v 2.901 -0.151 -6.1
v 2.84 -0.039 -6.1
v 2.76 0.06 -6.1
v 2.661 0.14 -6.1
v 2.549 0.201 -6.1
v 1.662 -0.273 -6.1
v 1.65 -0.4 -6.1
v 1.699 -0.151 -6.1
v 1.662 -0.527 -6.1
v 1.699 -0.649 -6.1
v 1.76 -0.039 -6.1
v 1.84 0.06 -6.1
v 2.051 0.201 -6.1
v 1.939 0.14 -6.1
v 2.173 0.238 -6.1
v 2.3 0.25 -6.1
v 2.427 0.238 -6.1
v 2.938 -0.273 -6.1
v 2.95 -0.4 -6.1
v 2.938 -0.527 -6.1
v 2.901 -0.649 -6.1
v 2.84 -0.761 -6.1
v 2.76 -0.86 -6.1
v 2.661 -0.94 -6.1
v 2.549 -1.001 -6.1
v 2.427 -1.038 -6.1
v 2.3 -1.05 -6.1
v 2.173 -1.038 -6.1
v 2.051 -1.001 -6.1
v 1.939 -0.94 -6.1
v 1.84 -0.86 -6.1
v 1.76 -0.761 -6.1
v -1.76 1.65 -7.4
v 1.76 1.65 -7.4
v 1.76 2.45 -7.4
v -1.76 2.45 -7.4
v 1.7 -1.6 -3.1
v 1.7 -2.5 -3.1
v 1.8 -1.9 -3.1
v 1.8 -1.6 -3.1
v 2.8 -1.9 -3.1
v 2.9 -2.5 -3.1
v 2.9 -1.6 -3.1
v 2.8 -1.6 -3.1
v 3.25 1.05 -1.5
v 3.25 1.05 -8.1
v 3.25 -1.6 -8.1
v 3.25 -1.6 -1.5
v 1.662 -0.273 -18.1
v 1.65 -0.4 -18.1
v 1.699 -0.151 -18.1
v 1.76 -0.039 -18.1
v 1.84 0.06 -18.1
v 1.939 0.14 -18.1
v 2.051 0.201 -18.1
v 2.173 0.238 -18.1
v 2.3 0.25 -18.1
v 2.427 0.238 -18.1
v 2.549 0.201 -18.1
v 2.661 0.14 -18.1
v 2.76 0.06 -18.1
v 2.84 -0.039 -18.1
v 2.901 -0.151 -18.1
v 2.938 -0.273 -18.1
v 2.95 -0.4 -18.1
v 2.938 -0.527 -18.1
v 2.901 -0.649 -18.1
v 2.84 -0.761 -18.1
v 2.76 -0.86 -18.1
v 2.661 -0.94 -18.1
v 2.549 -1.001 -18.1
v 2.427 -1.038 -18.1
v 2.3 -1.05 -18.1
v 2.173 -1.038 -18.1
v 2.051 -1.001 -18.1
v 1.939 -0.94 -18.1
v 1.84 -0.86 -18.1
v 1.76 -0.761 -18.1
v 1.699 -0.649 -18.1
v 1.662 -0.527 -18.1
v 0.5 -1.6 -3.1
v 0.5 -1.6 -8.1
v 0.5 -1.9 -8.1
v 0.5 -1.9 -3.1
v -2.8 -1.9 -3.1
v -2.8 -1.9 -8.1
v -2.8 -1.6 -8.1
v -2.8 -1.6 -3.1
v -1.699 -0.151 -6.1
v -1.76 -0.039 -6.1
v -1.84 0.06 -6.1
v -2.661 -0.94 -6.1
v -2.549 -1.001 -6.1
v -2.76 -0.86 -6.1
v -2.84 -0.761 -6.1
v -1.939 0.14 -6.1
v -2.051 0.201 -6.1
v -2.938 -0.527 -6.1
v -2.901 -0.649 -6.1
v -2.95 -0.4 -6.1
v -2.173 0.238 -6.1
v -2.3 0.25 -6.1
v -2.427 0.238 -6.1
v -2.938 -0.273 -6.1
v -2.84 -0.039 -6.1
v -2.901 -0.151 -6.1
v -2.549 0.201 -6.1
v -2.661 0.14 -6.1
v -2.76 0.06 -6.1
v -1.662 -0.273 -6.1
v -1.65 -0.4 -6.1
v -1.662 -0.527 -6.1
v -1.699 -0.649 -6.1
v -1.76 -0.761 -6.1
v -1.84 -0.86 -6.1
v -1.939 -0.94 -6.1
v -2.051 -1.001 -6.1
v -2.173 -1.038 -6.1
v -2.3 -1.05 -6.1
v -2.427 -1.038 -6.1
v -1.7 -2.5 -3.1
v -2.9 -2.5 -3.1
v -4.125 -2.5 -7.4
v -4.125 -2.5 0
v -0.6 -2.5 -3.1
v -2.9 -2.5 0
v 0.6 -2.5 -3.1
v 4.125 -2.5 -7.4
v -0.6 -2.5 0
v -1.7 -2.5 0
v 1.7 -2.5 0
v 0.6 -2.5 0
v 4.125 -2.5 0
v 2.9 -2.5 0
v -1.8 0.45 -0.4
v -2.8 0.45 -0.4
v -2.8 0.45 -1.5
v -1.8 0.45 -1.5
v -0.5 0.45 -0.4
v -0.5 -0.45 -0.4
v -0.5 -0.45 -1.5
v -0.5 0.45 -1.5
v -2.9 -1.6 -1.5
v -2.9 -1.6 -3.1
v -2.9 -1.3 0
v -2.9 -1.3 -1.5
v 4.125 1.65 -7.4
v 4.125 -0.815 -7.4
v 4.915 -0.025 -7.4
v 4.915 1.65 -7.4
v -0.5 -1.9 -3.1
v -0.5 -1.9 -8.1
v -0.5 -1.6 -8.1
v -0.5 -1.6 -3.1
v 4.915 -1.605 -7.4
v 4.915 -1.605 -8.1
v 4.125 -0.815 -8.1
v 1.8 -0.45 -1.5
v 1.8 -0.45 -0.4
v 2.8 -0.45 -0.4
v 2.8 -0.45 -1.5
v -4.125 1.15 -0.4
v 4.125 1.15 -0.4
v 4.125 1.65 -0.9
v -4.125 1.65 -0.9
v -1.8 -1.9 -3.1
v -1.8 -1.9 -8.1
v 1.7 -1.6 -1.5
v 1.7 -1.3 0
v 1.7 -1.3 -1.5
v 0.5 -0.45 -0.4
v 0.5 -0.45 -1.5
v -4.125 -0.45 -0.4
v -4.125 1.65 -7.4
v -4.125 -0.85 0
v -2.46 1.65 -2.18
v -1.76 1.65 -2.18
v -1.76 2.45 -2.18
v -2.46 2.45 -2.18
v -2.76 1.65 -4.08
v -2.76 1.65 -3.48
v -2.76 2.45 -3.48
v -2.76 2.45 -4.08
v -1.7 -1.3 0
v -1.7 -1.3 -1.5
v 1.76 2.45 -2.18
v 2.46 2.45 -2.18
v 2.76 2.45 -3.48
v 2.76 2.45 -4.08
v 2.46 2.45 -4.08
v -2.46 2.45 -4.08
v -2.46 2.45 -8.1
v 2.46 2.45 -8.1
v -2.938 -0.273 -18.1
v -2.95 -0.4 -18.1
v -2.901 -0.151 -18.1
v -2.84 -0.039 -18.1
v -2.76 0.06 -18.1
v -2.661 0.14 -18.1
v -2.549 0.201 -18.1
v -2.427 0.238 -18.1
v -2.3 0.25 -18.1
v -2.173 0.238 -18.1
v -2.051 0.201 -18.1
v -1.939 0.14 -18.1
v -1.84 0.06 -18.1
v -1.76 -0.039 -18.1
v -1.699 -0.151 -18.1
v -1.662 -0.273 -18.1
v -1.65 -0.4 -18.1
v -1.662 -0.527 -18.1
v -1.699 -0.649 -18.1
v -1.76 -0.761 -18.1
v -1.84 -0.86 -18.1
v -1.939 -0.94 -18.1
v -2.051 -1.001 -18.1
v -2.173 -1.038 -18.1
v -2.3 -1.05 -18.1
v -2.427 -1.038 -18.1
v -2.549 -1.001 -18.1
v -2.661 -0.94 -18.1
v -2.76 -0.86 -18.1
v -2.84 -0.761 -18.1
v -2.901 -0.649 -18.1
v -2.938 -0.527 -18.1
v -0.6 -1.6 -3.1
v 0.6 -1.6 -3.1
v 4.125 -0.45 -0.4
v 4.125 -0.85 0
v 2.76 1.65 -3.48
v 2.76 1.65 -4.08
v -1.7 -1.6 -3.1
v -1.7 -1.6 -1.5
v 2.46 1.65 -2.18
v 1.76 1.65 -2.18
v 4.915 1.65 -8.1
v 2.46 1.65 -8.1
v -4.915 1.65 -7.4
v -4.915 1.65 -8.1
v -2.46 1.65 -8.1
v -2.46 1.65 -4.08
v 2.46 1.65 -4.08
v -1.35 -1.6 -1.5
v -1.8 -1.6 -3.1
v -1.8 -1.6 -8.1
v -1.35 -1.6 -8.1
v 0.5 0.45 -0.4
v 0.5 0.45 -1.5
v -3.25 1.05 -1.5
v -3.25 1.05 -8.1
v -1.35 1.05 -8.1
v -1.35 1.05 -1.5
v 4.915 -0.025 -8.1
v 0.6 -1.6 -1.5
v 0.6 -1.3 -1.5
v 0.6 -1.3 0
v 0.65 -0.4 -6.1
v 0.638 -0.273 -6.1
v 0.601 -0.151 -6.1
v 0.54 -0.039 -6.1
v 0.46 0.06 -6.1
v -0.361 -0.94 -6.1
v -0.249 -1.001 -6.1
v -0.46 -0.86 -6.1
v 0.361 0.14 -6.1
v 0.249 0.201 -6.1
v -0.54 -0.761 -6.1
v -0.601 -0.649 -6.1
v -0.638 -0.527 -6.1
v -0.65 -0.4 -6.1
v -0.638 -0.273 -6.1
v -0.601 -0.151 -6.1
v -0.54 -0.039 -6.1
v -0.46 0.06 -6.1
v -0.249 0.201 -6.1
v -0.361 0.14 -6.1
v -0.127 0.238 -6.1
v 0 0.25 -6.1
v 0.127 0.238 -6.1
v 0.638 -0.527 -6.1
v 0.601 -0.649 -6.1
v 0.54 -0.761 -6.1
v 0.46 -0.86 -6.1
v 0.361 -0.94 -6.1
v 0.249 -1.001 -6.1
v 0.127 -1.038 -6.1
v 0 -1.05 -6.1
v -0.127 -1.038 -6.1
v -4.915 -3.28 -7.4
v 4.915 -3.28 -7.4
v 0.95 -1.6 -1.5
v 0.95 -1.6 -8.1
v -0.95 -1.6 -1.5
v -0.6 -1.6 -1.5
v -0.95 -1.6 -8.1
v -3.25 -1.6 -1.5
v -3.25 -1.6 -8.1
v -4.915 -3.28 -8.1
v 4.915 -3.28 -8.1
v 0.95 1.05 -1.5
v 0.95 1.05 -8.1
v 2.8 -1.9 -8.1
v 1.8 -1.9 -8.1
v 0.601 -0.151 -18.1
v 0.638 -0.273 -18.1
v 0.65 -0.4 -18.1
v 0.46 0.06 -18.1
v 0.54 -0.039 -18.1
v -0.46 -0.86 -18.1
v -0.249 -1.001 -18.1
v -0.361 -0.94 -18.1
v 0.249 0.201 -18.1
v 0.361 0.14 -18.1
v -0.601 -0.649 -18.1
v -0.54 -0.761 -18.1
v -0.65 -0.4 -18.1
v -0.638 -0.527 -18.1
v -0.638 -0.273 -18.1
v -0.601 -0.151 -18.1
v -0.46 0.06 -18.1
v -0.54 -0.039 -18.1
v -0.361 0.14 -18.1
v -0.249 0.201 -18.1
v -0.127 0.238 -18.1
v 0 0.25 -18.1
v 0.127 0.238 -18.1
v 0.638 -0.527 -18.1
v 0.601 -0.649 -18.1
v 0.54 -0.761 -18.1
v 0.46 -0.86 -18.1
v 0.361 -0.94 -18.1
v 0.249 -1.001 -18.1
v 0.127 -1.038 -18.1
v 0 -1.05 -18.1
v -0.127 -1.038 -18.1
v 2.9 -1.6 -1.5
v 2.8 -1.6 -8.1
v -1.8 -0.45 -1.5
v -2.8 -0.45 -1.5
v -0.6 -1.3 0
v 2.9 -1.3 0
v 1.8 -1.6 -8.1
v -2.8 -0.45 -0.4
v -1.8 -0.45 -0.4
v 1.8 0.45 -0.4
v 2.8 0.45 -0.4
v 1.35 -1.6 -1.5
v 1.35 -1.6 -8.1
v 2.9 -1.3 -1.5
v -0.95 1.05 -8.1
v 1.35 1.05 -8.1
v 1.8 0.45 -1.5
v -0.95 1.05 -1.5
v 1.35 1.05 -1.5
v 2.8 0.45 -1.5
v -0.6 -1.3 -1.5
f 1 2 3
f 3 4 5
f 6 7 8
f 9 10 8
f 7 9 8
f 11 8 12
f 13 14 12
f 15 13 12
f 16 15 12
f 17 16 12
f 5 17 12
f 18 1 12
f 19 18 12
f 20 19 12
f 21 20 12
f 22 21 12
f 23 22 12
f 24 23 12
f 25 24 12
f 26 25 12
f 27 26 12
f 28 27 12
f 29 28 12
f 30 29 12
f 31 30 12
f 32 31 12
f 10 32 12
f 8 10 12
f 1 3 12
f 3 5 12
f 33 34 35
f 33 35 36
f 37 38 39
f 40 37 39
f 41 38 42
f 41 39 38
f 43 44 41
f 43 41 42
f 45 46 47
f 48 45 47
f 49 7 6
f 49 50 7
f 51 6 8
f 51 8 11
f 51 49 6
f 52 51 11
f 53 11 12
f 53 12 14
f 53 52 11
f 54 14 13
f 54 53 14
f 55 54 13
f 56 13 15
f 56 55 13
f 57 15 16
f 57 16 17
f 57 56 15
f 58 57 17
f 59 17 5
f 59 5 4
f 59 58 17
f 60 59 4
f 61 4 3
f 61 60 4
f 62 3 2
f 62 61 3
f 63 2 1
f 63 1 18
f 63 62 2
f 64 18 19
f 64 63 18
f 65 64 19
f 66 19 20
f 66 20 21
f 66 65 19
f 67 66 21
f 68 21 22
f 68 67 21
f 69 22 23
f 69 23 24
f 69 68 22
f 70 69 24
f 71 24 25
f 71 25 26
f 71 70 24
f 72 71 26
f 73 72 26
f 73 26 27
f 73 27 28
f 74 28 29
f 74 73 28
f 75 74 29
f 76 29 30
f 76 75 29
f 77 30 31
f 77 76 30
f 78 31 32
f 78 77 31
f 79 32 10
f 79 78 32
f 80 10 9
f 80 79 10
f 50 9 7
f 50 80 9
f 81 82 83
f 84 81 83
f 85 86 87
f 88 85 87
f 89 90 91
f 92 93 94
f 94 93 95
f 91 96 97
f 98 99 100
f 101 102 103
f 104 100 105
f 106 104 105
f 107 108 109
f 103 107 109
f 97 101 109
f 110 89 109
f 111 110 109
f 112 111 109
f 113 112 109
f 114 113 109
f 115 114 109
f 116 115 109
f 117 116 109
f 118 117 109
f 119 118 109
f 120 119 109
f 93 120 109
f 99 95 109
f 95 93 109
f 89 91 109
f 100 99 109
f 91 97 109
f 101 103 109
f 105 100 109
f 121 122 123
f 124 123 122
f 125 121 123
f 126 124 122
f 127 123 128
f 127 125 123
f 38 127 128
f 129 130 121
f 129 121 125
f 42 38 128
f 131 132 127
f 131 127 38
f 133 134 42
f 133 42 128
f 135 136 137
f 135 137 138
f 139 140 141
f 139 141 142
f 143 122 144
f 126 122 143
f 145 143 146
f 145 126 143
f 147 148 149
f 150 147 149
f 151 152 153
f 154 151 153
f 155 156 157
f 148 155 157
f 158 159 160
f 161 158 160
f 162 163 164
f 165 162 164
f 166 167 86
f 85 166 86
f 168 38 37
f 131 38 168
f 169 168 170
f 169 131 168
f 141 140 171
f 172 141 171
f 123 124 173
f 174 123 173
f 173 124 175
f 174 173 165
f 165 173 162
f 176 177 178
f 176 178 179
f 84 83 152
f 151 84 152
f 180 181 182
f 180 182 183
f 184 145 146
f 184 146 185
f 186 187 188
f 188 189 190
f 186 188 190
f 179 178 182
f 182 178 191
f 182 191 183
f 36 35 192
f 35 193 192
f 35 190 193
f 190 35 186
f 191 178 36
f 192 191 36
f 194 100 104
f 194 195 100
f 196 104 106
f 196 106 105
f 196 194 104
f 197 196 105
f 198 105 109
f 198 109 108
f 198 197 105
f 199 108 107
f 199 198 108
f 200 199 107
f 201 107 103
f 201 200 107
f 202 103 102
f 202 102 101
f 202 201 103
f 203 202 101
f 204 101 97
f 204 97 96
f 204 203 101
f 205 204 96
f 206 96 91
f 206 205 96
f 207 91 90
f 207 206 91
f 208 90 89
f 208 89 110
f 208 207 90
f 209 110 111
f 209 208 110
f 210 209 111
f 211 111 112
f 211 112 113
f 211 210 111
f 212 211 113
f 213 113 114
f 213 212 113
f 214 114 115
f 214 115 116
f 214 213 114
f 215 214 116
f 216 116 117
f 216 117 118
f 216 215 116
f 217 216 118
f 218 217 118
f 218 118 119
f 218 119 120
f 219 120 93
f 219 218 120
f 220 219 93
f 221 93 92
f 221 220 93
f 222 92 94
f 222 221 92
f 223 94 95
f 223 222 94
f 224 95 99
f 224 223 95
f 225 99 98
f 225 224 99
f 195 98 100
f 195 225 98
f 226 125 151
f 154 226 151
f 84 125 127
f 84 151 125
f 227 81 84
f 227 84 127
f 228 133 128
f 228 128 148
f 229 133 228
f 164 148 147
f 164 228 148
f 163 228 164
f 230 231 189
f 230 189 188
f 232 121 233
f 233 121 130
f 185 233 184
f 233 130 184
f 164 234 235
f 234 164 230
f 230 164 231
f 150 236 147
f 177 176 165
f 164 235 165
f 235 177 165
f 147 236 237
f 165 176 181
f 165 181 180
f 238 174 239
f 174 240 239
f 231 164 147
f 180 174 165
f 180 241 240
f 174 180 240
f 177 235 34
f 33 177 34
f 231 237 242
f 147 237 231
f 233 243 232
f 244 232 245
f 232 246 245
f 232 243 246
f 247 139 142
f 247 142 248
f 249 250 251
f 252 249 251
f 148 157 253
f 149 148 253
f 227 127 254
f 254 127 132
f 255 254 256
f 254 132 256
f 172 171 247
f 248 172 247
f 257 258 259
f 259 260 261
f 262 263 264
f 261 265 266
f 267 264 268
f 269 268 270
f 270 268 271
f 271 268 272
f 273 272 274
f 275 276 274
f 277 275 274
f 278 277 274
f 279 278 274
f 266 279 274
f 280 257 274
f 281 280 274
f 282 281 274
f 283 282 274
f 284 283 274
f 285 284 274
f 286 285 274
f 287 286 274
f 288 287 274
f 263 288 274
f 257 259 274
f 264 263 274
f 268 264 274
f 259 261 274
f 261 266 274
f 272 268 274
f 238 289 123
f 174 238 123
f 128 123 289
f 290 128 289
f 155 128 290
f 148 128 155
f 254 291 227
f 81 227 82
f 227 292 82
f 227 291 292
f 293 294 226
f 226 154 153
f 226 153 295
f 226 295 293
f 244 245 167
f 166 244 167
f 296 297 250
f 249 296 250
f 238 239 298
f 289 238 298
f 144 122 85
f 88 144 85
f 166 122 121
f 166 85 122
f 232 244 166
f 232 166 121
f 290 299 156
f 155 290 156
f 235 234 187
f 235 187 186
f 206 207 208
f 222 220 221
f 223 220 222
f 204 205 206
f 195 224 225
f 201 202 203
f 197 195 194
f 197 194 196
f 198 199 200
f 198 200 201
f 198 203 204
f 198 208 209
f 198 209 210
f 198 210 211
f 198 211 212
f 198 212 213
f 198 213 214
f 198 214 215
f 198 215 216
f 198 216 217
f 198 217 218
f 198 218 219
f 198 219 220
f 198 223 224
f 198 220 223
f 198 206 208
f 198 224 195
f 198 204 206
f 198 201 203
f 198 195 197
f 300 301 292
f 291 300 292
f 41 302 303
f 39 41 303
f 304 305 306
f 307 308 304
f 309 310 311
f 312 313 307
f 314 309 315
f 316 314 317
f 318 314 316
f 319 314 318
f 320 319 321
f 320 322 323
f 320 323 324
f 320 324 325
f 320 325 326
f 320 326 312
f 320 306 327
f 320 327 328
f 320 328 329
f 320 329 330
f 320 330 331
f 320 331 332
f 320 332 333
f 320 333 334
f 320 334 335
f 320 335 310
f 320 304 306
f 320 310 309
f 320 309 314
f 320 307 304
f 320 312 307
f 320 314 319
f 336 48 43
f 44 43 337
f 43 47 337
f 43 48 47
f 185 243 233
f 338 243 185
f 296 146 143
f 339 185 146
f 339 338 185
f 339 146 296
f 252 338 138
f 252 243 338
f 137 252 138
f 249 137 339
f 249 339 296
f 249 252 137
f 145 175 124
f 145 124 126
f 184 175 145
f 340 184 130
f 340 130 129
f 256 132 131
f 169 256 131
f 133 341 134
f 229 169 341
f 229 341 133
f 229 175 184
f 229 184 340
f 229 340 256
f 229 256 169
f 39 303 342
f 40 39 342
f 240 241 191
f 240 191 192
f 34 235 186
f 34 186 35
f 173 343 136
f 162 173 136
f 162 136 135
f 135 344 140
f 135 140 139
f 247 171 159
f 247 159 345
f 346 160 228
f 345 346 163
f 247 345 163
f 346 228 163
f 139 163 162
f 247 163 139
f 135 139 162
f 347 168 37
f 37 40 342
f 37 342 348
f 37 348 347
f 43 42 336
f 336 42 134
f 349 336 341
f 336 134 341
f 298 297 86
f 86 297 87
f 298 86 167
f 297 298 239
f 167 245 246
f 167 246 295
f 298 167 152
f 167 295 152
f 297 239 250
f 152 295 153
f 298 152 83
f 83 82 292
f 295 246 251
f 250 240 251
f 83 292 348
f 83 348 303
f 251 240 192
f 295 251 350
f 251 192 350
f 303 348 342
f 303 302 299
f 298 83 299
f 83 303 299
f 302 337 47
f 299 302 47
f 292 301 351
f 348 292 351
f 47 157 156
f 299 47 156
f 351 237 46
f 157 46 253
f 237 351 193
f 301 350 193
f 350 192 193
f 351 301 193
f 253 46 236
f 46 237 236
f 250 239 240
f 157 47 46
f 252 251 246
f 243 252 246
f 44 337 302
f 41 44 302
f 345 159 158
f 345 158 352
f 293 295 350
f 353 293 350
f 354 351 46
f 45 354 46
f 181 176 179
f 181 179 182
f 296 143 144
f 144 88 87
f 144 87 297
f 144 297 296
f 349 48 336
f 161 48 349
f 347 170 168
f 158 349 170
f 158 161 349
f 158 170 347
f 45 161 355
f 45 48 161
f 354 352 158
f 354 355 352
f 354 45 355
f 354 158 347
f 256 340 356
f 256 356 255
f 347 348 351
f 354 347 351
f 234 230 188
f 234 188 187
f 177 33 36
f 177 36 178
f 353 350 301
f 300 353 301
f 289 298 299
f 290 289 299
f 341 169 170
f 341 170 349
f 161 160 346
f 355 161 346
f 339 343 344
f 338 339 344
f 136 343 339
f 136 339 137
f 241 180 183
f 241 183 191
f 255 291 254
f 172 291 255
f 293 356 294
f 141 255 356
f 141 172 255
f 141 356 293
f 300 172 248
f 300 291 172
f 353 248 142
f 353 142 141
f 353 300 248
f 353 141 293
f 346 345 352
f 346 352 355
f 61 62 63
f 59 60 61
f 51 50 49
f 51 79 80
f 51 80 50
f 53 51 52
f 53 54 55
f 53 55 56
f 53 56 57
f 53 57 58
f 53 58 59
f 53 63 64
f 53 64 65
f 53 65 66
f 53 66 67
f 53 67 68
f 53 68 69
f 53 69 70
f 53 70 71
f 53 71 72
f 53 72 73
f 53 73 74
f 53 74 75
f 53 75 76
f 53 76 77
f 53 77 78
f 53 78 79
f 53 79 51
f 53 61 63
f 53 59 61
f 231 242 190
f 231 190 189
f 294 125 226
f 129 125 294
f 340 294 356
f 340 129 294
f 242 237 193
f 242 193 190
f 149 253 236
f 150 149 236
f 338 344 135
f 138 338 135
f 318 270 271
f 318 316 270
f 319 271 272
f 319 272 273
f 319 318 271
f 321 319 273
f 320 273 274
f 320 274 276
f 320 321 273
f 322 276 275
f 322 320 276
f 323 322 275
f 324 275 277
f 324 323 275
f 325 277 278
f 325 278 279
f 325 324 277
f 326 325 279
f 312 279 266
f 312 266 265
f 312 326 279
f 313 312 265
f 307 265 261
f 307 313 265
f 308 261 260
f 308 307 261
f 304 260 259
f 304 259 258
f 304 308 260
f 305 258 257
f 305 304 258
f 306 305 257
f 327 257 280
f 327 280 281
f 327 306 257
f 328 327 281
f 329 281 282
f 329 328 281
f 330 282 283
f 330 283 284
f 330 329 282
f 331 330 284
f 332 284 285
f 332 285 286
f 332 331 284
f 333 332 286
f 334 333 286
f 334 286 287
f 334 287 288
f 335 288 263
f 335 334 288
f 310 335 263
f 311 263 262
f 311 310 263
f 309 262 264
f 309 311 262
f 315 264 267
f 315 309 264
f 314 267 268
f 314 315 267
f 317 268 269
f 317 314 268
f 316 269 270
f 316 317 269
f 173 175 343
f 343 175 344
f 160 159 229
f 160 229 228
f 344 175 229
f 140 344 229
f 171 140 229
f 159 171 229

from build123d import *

# Parameters (mm, degrees)
ESQUISSE1_W               = 8.25
ESQUISSE1_H               = 4.15
ESQUISSE1_W_2             = 1
ESQUISSE1_H_2             = 0.9
BOSS_EXTRU_1_DEPTH        = 8.1
ESQUISSE2_W               = 5.6
ESQUISSE2_H               = 0.9
BOSS_EXTRU_2_DEPTH        = 0.7
ENL_V_MAT_EXTRU_1_DEPTH   = 6.6
ENL_V_MAT_EXTRU_2_DEPTH   = 10.04
ESQUISSE6_W               = 1.2
ESQUISSE6_H               = 1.2
ENL_V_MAT_EXTRU_3_DEPTH   = 3.1
BOSS_EXTRU_3_DEPTH        = 0.8
ESQUISSE8_R               = 0.65
BOSS_EXTRU_4_DEPTH        = 10
BOSS_EXTRU_4_DEPTH_BACK   = 2
BOSS_EXTRU_4_2_DEPTH      = 10
BOSS_EXTRU_4_2_DEPTH_BACK = 2
BOSS_EXTRU_4_3_DEPTH      = 10
BOSS_EXTRU_4_3_DEPTH_BACK = 2


with BuildPart() as part:
    # Esquisse1 → Boss.-Extru.1 (new body)
    with BuildSketch(Plane.XY):
        with Locations((0, -0.425)):
            Rectangle(ESQUISSE1_W, ESQUISSE1_H)
        Rectangle(ESQUISSE1_W_2, ESQUISSE1_H_2, mode=Mode.SUBTRACT)
        with Locations((-2.3, 0)):
            Rectangle(ESQUISSE1_W_2, ESQUISSE1_H_2, mode=Mode.SUBTRACT)
        with Locations((2.3, 0)):
            Rectangle(ESQUISSE1_W_2, ESQUISSE1_H_2, mode=Mode.SUBTRACT)
    extrude(amount=-BOSS_EXTRU_1_DEPTH)

    # Esquisse2 → Boss.-Extru.2 (add)
    with BuildSketch(Plane(origin=(0, 0, -8.1), x_dir=(-1, 0, 0), z_dir=(0, 0, -1))):
        Polygon((-4.915, 1.65), (4.915, 1.65), (4.915, -3.28), (-4.915, -3.28), (-4.915, -1.605), (-4.125, -0.815), (-4.915, -0.025), align=None)
        Rectangle(ESQUISSE2_W, ESQUISSE2_H, mode=Mode.SUBTRACT)
    extrude(amount=-BOSS_EXTRU_2_DEPTH)

    # Esquisse3 → Enlèv. mat.-Extru.1 (cut)
    with BuildSketch(Plane(origin=(0, 0, -8.1), x_dir=(-1, 0, 0), z_dir=(0, 0, -1))):
        Polygon((0.5, -1.6), (0.95, -1.6), (0.95, 1.05), (-0.95, 1.05), (-0.95, -1.6), (-0.5, -1.6), (-0.5, -1.9), (0.5, -1.9), align=None)
        Polygon((-1.8, -1.6), (-1.35, -1.6), (-1.35, 1.05), (-3.25, 1.05), (-3.25, -1.6), (-2.8, -1.6), (-2.8, -1.9), (-1.8, -1.9), align=None)
        Polygon((2.8, -1.6), (3.25, -1.6), (3.25, 1.05), (1.35, 1.05), (1.35, -1.6), (1.8, -1.6), (1.8, -1.9), (2.8, -1.9), align=None)
    extrude(amount=-ENL_V_MAT_EXTRU_1_DEPTH, mode=Mode.SUBTRACT)

    # Esquisse4 → Enlèv. mat.-Extru.2 (cut, through all)
    with BuildSketch(Plane(origin=(4.125, 0, 0), x_dir=(0, 0, -1), z_dir=(1, 0, 0))):
        Polygon((0, -0.85), (0.4, -0.45), (0.4, 1.15), (0.9, 1.65), (0, 1.65), align=None)
    extrude(amount=-ENL_V_MAT_EXTRU_2_DEPTH, mode=Mode.SUBTRACT)

    # Esquisse6 → Enlèv. mat.-Extru.3 (cut)
    with BuildSketch(Plane.XY):
        with Locations((-2.3, -1.9)):
            Rectangle(ESQUISSE6_W, ESQUISSE6_H)
        with Locations((0, -1.9)):
            Rectangle(ESQUISSE6_W, ESQUISSE6_H)
        with Locations((2.3, -1.9)):
            Rectangle(ESQUISSE6_W, ESQUISSE6_H)
    extrude(amount=-ENL_V_MAT_EXTRU_3_DEPTH, mode=Mode.SUBTRACT)

    # Esquisse7 → Boss.-Extru.3 (add)
    with BuildSketch(Plane(origin=(0, 1.65, 0), x_dir=(1, 0, 0), z_dir=(0, 1, 0))):
        Polygon((-2.46, 8.1), (2.46, 8.1), (2.46, 4.08), (2.76, 4.08), (2.76, 3.48), (2.46, 2.18), (1.76, 2.18), (1.76, 7.4), (-1.76, 7.4), (-1.76, 2.18), (-2.46, 2.18), (-2.76, 3.48), (-2.76, 4.08), (-2.46, 4.08), align=None)
    extrude(amount=BOSS_EXTRU_3_DEPTH)


with BuildPart() as body_2:
    # Esquisse8 → Boss.-Extru.4 (new body, two sides)
    with BuildSketch(Plane(origin=(0, 0, -8.1), x_dir=(-1, 0, 0), z_dir=(0, 0, -1))) as boss_extru_4_sk:
        with Locations((0, -0.4)):
            Circle(ESQUISSE8_R)
    extrude(amount=BOSS_EXTRU_4_DEPTH)
    extrude(boss_extru_4_sk.sketch, amount=-BOSS_EXTRU_4_DEPTH_BACK)


with BuildPart() as body_3:
    # Esquisse8 → Boss.-Extru.4 2 (new body, two sides)
    with BuildSketch(Plane(origin=(0, 0, -8.1), x_dir=(-1, 0, 0), z_dir=(0, 0, -1))) as boss_extru_4_2_sk:
        with Locations((-2.3, -0.4)):
            Circle(ESQUISSE8_R)
    extrude(amount=BOSS_EXTRU_4_2_DEPTH)
    extrude(boss_extru_4_2_sk.sketch, amount=-BOSS_EXTRU_4_2_DEPTH_BACK)


with BuildPart() as body_4:
    # Esquisse8 → Boss.-Extru.4 3 (new body, two sides)
    with BuildSketch(Plane(origin=(0, 0, -8.1), x_dir=(-1, 0, 0), z_dir=(0, 0, -1))) as boss_extru_4_3_sk:
        with Locations((2.3, -0.4)):
            Circle(ESQUISSE8_R)
    extrude(amount=BOSS_EXTRU_4_3_DEPTH)
    extrude(boss_extru_4_3_sk.sketch, amount=-BOSS_EXTRU_4_3_DEPTH_BACK)


solid = Compound([part.part, body_2.part, body_3.part, body_4.part])
